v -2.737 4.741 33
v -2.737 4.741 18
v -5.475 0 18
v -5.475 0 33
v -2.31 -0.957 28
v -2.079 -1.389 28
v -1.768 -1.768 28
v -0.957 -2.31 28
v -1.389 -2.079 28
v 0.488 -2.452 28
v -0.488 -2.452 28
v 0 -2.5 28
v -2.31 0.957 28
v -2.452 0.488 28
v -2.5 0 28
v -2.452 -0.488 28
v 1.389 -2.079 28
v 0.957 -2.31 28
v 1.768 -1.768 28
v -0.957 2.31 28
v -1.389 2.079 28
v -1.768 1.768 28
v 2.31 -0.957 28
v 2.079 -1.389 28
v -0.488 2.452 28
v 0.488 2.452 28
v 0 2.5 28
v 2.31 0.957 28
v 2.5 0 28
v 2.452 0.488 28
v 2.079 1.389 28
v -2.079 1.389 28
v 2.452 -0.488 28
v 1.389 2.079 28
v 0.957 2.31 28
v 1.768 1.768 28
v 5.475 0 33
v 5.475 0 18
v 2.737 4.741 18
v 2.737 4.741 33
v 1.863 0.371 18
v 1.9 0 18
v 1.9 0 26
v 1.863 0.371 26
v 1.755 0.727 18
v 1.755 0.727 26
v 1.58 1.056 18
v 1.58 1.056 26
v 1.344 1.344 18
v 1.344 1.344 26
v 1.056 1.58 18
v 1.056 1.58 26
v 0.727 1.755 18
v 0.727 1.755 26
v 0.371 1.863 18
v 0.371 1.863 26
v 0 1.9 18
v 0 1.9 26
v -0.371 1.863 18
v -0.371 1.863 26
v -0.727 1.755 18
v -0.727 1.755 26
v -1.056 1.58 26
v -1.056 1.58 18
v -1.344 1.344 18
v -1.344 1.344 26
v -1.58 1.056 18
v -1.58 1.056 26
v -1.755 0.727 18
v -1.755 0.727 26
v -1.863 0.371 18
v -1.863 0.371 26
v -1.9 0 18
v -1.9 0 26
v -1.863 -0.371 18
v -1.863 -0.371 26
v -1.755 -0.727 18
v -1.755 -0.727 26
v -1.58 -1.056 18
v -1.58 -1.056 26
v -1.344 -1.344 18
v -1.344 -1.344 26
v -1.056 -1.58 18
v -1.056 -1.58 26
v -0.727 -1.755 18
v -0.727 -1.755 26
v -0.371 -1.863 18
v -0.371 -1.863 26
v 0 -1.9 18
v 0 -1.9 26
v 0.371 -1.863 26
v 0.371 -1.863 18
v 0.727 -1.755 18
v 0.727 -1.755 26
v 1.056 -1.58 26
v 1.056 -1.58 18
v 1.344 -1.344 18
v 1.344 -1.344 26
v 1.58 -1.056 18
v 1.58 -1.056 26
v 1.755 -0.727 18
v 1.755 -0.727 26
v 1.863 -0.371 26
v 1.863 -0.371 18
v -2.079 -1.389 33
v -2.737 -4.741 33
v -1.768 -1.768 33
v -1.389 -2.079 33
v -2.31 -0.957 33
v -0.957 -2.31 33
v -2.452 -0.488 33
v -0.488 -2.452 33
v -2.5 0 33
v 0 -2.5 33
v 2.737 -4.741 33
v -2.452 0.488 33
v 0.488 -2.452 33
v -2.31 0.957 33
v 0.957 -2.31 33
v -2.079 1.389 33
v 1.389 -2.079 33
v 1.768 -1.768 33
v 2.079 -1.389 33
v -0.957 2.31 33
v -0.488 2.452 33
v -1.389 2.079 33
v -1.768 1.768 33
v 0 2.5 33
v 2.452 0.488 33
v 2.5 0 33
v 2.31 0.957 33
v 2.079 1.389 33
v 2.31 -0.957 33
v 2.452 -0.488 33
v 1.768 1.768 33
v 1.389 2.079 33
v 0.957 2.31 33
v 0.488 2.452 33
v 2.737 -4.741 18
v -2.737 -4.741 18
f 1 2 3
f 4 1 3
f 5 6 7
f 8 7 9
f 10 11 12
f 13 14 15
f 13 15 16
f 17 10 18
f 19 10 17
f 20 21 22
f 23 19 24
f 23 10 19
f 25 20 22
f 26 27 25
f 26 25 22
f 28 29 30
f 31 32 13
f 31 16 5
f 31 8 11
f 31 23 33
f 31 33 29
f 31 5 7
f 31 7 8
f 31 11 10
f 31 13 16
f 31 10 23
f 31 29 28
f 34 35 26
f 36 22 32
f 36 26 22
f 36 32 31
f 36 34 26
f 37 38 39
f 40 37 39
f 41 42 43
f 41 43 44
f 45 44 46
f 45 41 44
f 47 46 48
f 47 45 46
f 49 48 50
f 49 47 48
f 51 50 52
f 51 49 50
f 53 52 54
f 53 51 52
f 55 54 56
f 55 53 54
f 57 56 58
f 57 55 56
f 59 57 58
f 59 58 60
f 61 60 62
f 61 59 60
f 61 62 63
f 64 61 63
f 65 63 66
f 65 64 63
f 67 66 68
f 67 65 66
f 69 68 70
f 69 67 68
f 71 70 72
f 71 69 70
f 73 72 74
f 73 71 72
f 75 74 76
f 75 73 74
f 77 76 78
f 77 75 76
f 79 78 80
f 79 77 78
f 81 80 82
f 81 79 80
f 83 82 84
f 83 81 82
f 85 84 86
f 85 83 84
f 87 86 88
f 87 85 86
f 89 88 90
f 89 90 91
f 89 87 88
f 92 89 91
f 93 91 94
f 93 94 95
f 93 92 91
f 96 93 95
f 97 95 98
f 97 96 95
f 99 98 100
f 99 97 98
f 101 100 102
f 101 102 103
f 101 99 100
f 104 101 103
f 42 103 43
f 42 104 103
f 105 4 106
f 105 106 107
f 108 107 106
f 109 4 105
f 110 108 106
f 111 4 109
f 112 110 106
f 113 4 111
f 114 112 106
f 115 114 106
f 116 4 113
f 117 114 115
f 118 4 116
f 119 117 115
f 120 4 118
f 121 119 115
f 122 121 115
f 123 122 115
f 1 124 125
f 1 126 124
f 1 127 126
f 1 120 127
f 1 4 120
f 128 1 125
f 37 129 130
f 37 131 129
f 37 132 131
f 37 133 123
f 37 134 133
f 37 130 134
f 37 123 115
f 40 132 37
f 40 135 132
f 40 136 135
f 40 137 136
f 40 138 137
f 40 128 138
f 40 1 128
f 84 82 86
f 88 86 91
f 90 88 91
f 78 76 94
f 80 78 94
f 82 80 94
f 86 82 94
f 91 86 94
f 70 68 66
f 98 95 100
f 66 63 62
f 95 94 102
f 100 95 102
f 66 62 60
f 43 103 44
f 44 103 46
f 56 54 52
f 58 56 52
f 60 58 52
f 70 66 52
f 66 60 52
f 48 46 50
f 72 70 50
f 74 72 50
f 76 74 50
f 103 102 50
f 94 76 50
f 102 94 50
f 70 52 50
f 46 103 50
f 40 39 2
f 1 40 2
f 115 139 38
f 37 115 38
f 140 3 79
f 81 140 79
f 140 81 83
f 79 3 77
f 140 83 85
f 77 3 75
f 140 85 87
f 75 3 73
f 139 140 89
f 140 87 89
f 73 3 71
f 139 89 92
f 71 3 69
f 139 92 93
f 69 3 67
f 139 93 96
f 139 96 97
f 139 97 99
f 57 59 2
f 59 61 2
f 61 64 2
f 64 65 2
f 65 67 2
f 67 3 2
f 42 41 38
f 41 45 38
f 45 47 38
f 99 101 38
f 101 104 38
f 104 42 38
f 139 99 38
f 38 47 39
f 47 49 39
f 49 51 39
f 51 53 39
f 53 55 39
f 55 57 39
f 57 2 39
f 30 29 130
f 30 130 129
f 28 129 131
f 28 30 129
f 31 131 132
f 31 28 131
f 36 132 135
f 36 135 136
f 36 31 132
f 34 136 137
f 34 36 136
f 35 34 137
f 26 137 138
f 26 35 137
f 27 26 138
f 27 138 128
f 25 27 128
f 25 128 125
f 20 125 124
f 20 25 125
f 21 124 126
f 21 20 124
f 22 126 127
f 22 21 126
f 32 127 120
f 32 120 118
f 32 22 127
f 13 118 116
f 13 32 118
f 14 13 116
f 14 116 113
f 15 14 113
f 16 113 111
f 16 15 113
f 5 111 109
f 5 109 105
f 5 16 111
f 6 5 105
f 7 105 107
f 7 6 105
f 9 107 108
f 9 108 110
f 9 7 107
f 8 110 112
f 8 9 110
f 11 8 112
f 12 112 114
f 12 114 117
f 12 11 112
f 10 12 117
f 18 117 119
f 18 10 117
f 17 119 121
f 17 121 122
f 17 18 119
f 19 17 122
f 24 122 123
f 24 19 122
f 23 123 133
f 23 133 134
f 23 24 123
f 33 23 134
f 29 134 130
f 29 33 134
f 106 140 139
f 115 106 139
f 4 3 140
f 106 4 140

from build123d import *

# Parameters (mm, degrees)
CYLINDER017_R     = 1.9
CYLINDER017_DEPTH = 8
CYLINDER022_R     = 2.5
CYLINDER022_DEPTH = 5
PRISM_DEPTH       = 15


with BuildPart() as zylinder017:
    # Cylinder017 → Cylinder017 (new body)
    with BuildSketch(Plane.XY):
        Circle(CYLINDER017_R)
    extrude(amount=CYLINDER017_DEPTH)


with BuildPart() as zylinder020:
    # Cylinder022 → Cylinder022 (new body)
    with BuildSketch(Plane.XY.offset(10)):
        Circle(CYLINDER022_R)
    extrude(amount=CYLINDER022_DEPTH)


with BuildPart() as shaft_fixer:
    # Prism → Prism (new body)
    with BuildSketch(Plane.XY):
        Polygon((5.47476, 0), (2.73738, 4.741281), (-2.73738, 4.741281), (-5.47476, 0), (-2.73738, -4.741281), (2.73738, -4.741281), align=None)
    extrude(amount=PRISM_DEPTH)

    # Cut039: cut Zylinder020
    add(zylinder020.part, mode=Mode.SUBTRACT)

    # Cut040: cut Zylinder017
    add(zylinder017.part, mode=Mode.SUBTRACT)


with BuildPart() as shaft_fixer_1:
    # Cut040 placement: moved
    add(shaft_fixer.part.moved(Location((0, 0, 18))))


solid = shaft_fixer_1.part
